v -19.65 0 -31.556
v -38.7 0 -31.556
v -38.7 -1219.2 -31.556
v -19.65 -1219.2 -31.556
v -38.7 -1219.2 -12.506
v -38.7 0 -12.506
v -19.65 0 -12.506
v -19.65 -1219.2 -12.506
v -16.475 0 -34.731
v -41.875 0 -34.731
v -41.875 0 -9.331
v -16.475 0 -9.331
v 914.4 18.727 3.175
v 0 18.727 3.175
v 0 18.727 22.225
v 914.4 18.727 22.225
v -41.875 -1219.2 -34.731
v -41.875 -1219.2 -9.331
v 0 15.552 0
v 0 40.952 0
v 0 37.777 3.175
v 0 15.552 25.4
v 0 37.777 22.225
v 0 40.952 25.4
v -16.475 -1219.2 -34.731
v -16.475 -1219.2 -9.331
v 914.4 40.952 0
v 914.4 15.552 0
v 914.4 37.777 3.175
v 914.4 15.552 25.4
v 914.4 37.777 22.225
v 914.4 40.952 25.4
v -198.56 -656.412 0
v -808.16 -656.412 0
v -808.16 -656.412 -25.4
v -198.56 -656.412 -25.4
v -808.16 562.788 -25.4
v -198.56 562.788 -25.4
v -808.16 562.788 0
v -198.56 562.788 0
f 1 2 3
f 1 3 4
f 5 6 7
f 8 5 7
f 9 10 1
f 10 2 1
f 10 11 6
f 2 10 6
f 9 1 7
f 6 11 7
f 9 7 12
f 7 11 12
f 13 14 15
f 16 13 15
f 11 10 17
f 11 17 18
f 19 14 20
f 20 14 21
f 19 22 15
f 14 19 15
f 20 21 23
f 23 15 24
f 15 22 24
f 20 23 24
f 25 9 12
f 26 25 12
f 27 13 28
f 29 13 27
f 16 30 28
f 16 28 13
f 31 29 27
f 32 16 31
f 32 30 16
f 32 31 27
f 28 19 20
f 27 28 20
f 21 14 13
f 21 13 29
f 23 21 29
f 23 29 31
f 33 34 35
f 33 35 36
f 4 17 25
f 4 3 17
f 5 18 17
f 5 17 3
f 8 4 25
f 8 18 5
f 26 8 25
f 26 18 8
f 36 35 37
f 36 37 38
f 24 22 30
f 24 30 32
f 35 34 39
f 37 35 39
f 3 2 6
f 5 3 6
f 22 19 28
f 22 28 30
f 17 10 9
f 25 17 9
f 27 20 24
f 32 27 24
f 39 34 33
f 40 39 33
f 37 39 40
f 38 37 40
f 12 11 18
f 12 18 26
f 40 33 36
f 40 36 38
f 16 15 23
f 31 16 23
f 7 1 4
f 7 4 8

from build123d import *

# Parameters (mm, degrees)
F0_W      = 101.6
F0_H      = 19.05
F2_DEPTH  = 609.6
F1_W      = 101.6
F1_H      = 19.05
F3_DEPTH  = 1219.2
F5_W      = 609.6
F5_H      = 1219.2
F6_DEPTH  = 25.4
F7_W      = 25.4
F7_H      = 25.4
F7_W_2    = 19.05
F7_H_2    = 19.05
F8_DEPTH  = 1219.2
F9_W      = 25.4
F9_H      = 25.4
F9_W_2    = 19.05
F9_H_2    = 19.05
F10_DEPTH = 914.4


with BuildPart() as f2:
    # F0 (on Right) → F2 (new body)
    with BuildSketch(Plane.YZ):
        with Locations((-79.195688796, -22.0583576024)):
            Rectangle(F0_W, F0_H)
    extrude(amount=-F2_DEPTH)


with BuildPart() as f3:
    # F1 (on Front) → F3 (new body)
    with BuildSketch(Plane.XZ):
        with Locations((95.3139266978, 31.5791172907)):
            Rectangle(F1_W, F1_H)
    extrude(amount=-F3_DEPTH)


with BuildPart() as f6:
    # F5 (on Top) → F6 (new body)
    with BuildSketch(Plane.XY):
        with Locations((-503.359906985, -46.8117073178)):
            Rectangle(F5_W, F5_H)
    extrude(amount=-F6_DEPTH)


with BuildPart() as f8:
    # F7 (on Front) → F8 (new body)
    with BuildSketch(Plane.XZ):
        with Locations((-29.1747529991, -22.0307169825)):
            Rectangle(F7_W, F7_H)
        with Locations((-29.1747529991, -22.0307169825)):
            Rectangle(F7_W_2, F7_H_2, mode=Mode.SUBTRACT)
    extrude(amount=F8_DEPTH)


with BuildPart() as f10:
    # F9 (on Right) → F10 (new body)
    with BuildSketch(Plane.YZ):
        with Locations((28.2520343765, 12.7)):
            Rectangle(F9_W, F9_H)
        with Locations((28.2520343765, 12.7)):
            Rectangle(F9_W_2, F9_H_2, mode=Mode.SUBTRACT)
    extrude(amount=F10_DEPTH)


solid = Compound([f6.part, f8.part, f10.part])
